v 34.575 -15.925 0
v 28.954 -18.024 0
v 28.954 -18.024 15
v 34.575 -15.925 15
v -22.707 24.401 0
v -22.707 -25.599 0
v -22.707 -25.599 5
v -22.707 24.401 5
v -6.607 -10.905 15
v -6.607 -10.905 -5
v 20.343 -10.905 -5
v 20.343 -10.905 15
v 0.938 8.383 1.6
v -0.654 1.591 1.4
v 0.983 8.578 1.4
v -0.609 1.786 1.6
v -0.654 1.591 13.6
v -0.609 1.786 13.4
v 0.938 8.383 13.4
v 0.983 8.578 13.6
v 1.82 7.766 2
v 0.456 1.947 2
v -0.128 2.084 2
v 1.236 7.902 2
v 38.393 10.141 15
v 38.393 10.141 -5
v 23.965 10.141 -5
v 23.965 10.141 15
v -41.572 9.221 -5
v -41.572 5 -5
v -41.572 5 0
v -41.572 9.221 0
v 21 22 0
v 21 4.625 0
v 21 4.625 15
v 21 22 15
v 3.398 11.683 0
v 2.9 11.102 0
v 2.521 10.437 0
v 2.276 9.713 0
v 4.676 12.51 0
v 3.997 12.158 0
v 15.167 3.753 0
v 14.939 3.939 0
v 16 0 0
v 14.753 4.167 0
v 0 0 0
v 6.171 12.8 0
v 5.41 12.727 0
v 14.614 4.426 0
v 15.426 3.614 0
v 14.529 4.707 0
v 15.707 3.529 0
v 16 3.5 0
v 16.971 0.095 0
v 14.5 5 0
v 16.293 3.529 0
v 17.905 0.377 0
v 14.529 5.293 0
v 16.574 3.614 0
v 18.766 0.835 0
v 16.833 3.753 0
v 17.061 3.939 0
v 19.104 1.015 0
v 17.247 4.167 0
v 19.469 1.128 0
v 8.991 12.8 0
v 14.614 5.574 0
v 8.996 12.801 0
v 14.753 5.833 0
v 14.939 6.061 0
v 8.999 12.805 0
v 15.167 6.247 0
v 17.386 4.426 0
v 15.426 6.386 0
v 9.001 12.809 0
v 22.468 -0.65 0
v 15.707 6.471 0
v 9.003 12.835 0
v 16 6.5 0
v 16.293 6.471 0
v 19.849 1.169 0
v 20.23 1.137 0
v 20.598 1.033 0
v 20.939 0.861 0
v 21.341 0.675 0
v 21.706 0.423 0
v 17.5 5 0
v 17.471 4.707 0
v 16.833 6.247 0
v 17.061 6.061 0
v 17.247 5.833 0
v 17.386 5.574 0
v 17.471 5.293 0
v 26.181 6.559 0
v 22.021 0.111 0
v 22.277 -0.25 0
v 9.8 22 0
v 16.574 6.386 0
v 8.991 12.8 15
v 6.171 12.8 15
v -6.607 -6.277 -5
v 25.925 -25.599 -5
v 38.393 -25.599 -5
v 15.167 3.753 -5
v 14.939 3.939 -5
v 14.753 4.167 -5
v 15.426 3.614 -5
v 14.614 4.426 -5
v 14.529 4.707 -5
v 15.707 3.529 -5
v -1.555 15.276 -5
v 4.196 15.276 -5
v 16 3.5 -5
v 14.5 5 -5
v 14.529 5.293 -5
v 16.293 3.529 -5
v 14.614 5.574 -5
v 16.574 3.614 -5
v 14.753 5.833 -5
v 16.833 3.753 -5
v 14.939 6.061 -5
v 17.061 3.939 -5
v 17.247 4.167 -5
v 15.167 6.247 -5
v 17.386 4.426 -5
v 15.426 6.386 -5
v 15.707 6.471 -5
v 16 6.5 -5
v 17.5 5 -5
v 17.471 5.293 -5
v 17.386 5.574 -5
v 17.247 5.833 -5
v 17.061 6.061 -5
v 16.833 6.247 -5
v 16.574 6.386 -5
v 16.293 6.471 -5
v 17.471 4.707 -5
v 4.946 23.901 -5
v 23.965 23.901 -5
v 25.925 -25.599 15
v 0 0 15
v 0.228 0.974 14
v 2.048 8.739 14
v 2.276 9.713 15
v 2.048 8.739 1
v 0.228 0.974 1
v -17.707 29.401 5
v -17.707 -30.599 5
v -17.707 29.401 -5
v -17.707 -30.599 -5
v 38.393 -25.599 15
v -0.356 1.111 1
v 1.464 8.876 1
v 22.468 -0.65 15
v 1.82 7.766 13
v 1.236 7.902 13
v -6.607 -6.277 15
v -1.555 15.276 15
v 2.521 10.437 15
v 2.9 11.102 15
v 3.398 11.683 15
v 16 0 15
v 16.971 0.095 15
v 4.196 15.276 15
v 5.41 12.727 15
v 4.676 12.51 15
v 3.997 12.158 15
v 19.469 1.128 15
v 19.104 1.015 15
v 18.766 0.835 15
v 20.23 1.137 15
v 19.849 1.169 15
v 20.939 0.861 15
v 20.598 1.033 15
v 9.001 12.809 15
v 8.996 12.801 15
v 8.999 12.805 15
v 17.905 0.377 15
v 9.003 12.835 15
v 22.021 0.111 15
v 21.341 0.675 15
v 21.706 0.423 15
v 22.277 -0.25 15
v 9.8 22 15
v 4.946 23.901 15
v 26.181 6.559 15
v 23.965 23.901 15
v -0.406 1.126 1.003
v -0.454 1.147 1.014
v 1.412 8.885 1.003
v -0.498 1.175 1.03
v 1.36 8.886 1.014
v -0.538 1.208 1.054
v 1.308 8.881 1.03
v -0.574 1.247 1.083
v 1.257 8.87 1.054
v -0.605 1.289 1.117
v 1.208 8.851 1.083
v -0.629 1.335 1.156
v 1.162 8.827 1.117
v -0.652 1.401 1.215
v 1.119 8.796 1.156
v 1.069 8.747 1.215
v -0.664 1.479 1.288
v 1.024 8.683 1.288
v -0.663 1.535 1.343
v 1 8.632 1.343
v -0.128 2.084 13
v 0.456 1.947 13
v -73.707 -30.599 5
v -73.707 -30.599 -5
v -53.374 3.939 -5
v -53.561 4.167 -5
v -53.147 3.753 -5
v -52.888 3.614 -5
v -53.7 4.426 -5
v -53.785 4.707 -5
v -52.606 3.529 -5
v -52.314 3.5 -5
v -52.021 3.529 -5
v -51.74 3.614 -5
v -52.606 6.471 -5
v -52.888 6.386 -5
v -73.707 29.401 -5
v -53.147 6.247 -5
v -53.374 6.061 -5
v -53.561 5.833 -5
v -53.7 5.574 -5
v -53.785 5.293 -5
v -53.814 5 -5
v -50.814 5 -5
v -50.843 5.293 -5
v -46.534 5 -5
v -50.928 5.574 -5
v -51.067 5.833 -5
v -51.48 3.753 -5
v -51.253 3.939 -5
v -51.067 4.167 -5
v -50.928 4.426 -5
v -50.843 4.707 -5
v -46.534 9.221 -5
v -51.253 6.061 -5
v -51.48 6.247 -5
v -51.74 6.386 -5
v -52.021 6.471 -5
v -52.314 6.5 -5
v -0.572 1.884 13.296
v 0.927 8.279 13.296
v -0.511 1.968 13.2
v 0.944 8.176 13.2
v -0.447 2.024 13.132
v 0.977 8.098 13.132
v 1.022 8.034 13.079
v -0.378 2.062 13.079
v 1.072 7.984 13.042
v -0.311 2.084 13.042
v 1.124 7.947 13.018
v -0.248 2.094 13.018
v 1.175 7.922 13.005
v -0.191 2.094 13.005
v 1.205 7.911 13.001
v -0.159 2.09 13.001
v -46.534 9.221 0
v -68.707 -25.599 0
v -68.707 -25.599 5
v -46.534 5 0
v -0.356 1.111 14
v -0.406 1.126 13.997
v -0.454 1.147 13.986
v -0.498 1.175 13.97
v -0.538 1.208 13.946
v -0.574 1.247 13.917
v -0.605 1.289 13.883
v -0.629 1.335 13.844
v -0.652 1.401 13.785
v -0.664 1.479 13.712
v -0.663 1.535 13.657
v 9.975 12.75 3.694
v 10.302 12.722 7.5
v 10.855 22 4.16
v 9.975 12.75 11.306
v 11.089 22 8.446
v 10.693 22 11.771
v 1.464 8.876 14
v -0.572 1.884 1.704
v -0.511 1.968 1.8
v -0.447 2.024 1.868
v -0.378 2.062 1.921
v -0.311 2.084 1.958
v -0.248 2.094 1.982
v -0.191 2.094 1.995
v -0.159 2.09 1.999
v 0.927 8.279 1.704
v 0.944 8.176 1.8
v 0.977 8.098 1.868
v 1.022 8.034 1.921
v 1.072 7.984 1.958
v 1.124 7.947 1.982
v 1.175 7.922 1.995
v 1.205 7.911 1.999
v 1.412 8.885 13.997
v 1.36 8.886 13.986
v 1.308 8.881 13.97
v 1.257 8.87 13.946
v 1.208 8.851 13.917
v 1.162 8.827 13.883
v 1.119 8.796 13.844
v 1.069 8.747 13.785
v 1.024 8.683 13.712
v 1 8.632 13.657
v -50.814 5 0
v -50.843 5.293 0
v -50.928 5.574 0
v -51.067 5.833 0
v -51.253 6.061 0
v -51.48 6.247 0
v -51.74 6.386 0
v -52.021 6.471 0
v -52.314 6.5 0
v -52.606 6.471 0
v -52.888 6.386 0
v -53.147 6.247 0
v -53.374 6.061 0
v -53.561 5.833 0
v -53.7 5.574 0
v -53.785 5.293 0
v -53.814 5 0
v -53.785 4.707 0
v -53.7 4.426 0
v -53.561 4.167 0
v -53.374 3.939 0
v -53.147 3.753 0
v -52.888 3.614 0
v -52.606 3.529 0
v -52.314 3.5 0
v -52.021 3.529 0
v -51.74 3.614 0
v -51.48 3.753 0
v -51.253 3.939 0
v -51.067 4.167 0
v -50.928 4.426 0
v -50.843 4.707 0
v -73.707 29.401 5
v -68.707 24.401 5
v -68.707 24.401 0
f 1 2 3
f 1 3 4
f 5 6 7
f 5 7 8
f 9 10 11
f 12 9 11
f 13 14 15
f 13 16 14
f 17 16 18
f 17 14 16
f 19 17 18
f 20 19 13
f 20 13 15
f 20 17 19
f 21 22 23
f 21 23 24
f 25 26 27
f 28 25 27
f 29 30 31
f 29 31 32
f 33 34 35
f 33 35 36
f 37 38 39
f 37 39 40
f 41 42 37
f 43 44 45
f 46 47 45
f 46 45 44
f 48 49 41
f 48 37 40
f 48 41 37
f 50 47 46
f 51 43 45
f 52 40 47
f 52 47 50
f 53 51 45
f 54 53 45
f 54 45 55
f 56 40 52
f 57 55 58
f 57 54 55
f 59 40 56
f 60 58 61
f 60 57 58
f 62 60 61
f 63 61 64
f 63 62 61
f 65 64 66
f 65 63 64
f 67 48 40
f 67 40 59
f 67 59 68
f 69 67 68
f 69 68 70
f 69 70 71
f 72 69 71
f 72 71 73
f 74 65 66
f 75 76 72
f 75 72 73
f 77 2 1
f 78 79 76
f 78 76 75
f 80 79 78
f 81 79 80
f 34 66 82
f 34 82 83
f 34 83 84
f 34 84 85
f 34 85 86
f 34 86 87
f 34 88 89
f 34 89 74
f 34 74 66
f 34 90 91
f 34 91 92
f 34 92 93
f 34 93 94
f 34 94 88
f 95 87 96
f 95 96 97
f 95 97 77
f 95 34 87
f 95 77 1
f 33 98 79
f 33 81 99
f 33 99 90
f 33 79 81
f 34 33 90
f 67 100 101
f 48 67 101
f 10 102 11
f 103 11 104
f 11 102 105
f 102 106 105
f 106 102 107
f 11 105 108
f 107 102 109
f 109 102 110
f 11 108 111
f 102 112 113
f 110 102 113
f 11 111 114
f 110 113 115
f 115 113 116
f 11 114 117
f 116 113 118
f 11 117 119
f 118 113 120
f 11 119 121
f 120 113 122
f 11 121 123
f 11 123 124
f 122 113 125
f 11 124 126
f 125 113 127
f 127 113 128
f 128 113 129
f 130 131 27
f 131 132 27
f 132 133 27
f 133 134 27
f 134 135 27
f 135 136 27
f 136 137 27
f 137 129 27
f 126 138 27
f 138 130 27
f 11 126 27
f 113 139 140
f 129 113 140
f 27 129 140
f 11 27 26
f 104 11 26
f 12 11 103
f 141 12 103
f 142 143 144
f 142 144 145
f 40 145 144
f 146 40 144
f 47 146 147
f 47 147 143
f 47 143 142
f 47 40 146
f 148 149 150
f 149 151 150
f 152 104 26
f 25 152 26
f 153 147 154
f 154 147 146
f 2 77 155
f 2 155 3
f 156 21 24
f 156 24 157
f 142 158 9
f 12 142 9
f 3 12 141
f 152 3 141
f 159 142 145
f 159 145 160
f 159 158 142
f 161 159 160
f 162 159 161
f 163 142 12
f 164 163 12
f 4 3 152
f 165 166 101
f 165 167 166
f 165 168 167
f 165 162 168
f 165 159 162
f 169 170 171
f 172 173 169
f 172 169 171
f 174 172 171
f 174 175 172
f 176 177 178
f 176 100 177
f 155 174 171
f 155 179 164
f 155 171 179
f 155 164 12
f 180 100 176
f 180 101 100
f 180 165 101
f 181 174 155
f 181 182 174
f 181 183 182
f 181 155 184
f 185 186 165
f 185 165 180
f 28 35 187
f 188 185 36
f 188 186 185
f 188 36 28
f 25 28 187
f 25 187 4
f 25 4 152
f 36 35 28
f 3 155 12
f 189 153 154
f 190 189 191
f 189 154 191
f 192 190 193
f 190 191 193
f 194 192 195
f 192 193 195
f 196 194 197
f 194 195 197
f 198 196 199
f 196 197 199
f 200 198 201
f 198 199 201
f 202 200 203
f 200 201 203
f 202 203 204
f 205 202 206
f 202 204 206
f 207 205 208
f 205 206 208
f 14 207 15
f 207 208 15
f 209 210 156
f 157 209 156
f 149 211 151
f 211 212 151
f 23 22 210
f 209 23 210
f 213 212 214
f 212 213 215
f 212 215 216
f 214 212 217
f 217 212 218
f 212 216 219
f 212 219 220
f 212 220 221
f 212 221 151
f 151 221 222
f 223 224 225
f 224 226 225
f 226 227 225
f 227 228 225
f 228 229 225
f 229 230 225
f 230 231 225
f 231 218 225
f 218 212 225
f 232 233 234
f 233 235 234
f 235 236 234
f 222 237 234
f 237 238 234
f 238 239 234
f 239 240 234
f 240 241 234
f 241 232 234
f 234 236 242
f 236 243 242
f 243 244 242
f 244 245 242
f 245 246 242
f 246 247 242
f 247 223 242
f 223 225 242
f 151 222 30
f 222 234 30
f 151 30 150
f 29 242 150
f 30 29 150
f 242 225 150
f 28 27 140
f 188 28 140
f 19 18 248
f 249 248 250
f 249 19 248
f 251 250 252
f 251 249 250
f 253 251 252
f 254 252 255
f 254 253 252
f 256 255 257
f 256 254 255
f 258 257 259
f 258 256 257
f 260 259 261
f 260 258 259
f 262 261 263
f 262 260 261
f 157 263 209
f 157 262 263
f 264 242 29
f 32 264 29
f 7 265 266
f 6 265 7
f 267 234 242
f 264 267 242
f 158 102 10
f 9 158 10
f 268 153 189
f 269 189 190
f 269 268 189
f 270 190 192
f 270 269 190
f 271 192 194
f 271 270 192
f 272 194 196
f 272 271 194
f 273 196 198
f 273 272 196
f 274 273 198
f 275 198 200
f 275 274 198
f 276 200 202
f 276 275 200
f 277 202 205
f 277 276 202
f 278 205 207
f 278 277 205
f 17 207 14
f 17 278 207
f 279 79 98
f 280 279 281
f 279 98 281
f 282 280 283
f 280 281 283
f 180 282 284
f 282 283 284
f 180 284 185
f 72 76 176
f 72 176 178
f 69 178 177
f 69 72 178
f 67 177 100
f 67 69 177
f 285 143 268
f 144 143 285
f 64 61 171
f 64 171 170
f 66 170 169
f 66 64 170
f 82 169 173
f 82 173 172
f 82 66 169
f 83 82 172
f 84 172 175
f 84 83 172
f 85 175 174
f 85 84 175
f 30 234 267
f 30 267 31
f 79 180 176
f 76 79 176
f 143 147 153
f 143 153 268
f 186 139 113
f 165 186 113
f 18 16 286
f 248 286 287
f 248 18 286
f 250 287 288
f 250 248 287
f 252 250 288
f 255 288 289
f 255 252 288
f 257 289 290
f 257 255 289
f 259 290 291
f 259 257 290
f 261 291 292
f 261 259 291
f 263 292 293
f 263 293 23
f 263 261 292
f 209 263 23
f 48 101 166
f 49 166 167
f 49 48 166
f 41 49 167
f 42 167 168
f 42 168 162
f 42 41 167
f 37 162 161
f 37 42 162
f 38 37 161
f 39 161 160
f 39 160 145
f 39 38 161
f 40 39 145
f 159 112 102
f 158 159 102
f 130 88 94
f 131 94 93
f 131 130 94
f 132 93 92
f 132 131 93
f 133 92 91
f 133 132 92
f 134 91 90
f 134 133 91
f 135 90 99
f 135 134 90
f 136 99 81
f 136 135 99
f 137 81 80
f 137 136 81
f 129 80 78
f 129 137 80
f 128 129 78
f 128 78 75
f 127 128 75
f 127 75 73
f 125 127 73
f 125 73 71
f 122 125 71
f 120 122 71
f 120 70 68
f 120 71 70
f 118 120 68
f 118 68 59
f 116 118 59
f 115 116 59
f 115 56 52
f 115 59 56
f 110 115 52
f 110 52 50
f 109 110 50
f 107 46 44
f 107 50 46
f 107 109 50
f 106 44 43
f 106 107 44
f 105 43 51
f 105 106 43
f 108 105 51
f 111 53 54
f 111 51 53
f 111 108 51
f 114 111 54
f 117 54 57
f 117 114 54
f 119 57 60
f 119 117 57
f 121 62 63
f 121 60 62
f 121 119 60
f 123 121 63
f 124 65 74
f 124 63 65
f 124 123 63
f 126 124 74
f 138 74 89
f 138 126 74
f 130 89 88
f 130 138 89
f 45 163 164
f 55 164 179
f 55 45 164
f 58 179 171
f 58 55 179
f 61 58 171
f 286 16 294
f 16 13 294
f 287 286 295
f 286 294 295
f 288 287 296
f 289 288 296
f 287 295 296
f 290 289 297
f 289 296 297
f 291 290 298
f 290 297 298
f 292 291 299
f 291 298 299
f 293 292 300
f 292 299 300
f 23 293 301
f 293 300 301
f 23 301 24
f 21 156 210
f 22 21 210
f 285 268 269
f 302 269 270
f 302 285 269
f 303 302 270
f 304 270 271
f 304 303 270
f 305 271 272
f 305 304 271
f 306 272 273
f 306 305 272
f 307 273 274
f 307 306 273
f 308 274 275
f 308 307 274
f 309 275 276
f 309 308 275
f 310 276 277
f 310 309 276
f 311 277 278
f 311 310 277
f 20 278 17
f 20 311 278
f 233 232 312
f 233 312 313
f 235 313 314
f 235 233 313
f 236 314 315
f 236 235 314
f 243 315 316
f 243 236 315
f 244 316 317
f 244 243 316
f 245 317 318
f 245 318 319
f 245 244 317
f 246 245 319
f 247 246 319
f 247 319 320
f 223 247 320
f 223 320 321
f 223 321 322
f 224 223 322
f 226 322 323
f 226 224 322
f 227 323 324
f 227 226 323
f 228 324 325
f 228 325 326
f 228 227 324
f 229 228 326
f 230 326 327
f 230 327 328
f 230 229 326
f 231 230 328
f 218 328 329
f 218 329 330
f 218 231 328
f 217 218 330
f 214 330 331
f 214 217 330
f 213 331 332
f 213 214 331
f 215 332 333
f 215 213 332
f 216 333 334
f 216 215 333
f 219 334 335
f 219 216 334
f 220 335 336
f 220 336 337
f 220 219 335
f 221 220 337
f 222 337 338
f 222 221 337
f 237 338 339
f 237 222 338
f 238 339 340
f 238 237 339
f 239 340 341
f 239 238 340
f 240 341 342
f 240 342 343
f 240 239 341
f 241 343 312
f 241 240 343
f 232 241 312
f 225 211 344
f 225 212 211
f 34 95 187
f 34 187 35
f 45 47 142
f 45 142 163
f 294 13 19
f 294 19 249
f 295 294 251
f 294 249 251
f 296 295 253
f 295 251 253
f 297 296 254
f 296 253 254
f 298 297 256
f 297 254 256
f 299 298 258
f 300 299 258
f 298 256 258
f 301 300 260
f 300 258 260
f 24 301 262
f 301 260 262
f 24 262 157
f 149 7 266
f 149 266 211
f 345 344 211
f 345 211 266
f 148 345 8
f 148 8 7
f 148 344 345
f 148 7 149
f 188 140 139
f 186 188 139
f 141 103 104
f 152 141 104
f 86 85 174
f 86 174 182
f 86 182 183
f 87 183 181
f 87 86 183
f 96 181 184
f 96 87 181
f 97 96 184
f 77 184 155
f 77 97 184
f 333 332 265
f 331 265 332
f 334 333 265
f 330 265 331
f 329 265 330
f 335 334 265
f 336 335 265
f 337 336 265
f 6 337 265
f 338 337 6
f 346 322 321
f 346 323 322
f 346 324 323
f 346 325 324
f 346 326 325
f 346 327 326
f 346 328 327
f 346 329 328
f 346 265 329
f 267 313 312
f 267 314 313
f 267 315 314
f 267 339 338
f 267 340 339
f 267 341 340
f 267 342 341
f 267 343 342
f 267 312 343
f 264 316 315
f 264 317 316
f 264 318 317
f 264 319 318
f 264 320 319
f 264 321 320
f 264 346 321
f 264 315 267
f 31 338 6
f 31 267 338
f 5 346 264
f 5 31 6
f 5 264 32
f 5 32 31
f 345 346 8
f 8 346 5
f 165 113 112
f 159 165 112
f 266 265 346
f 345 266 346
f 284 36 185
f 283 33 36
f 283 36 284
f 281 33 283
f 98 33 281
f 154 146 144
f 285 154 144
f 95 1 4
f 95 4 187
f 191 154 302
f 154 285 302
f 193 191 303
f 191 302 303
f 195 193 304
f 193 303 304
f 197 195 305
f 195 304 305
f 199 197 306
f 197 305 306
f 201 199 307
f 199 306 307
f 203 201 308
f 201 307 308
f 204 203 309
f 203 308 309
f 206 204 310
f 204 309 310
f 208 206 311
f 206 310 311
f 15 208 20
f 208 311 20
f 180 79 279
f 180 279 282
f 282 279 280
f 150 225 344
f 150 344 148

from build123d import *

# Parameters (mm, degrees)
F1_DEPTH      = 15
F4_DEPTH      = 9.2
F4_DEPTH_BACK = 1
F6_R          = 1.5
F7_DEPTH      = 20
F9_R          = 1.5
F10_DEPTH     = 5
F11_W         = 56
F11_H         = 60
F11_R         = 1.5
F11_W_2       = 4.962
F11_H_2       = 4.2207975686
F12_DEPTH     = 5
F14_W         = 56
F14_H         = 60
F14_W_2       = 46
F14_H_2       = 50
F15_DEPTH     = 5
F20_W         = 7.9759681362
F20_H         = 13
F20_W_2       = 5.9759681362
F20_H_2       = 11
F21_DEPTH     = 1
F22_R         = 0.4


# Not quite as in the source:
# - the program builds the solid bodies; features that only make, move or delete a surface that nothing else refers to are left out


with BuildPart() as f1:
    # F0 (on Top) → F1 (new body)
    with BuildSketch(Plane.XY):
        with BuildLine():
            Line((2.2764293651, 9.7127652912), (0, 0))
            Line((0, 0), (16, 0))
            ThreePointArc((16, 0), (17.4448615439, 0.2133127198), (18.7664401496, 0.8350499525))
            ThreePointArc((18.7664401496, 0.8350499525), (19.8489592754, 1.1689252442), (20.9391965895, 0.8611867726))
            ThreePointArc((20.9391965895, 0.8611867726), (21.8699515292, 0.2737220948), (22.4677167157, -0.6504512046))
            Line((22.4677167157, -0.6504512046), (28.953752481, -18.0237612902))
            Line((28.953752481, -18.0237612902), (34.5748015694, -15.9252362972))
            Line((34.5748015694, -15.9252362972), (26.1807015974, 6.5589600562))
            Line((26.1807015974, 6.5589600562), (21, 4.6248314599))
            Line((21, 4.6248314599), (21, 22))
            Line((21, 22), (9.8, 22))
            Line((9.8, 22), (9.0007942351, 12.8091337038))
            ThreePointArc((9.0007942351, 12.8091337038), (8.9975896779, 12.8026290109), (8.9908318292, 12.8))
            Line((8.9908318292, 12.8), (6.1708946074, 12.8))
            ThreePointArc((6.1708946074, 12.8), (3.6860466407, 11.9345702389), (2.2764293651, 9.7127652912))
        make_face()
    extrude(amount=F1_DEPTH)

    # F3 (on face) → F4 (cut, two sides)
    with BuildSketch(Plane(origin=(1.9722326454, 22.6806754221, 0), x_dir=(0.9962405882, -0.0866296164, 0), z_dir=(-0.0866296164, -0.9962405882, 0))) as f4_sk:
        with BuildLine():
            Line((7.8573062043, 15), (7.8573062043, 0))
            ThreePointArc((7.8573062043, 0), (9.161162664, 7.5), (7.8573062043, 15))
        make_face()
    extrude(amount=F4_DEPTH, mode=Mode.SUBTRACT)
    extrude(f4_sk.sketch, amount=-F4_DEPTH_BACK, mode=Mode.SUBTRACT)


with BuildPart() as f7:
    # F6 (on offset) → F7 (new body)
    with BuildSketch(Plane.XY.offset(-5)):
        Polygon((23.9650979638, 23.9009789079), (4.9464345222, 23.9009789079), (4.1964484146, 15.2761386707), (-1.5551482583, 15.2761386707), (-6.6067720969, -6.2774563741), (-6.6067720969, -10.9053393826), (20.3434042633, -10.9053393826), (25.9253627227, -25.5990210921), (38.3932279031, -25.5990210921), (38.3932279031, 10.140940547), (23.9650979638, 10.140940547), align=None)
        with Locations((16, 5)):
            Circle(F6_R, mode=Mode.SUBTRACT)
    extrude(amount=F7_DEPTH)

    # F8: cut F1
    add(f1.part, mode=Mode.SUBTRACT)

    # F9 (on offset) → F10 (cut)
    with BuildSketch(Plane.XY.offset(-5)):
        with Locations((16, 5)):
            Circle(F9_R)
    extrude(amount=F10_DEPTH, mode=Mode.SUBTRACT)

    # F20 (on offset) → F21 (cut)
    with BuildSketch(Plane(origin=(0, 0, 0), x_dir=(0.2281913228, 0.9736163106, 0), z_dir=(0.9736163106, -0.2281913228, 0))):
        with Locations((4.9879840681, 7.5)):
            Rectangle(F20_W, F20_H)
        with Locations((4.9879840681, 7.5)):
            Rectangle(F20_W_2, F20_H_2, mode=Mode.SUBTRACT)
    extrude(amount=-F21_DEPTH, mode=Mode.SUBTRACT)

    # F22
    f22_edges = [f7.edges().sort_by_distance(p)[0] for p in [
        (1.074622, 8.96734, 7.5),
        (0.164598, 5.084574, 14),
        (-0.745425, 1.201808, 7.5),
        (0.164598, 5.084574, 1),
        (0.84643, 7.993724, 7.5),
        (0.164598, 5.084574, 13),
        (-0.517234, 2.175424, 7.5),
        (0.164598, 5.084574, 2),
    ]]
    fillet(f22_edges, radius=F22_R)


with BuildPart() as f12:
    # F11 (on offset) → F12 (new body)
    with BuildSketch(Plane.XY.offset(-5)):
        with Locations((-45.7067461014, -0.5990204215)):
            Rectangle(F11_W, F11_H)
        with Locations((-52.3137461014, 5)):
            Circle(F11_R, mode=Mode.SUBTRACT)
        with Locations((-44.052677727, 7.1103987843)):
            Rectangle(F11_W_2, F11_H_2, mode=Mode.SUBTRACT)
    extrude(amount=F12_DEPTH)

    # F14 (on offset) → F15 (join)
    with BuildSketch(Plane.XY):
        with Locations((-45.7067461014, -0.5990204215)):
            Rectangle(F14_W, F14_H)
        with Locations((-45.7067461014, -0.5990204215)):
            Rectangle(F14_W_2, F14_H_2, mode=Mode.SUBTRACT)
    extrude(amount=F15_DEPTH)


solid = Compound([f7.part, f12.part])
